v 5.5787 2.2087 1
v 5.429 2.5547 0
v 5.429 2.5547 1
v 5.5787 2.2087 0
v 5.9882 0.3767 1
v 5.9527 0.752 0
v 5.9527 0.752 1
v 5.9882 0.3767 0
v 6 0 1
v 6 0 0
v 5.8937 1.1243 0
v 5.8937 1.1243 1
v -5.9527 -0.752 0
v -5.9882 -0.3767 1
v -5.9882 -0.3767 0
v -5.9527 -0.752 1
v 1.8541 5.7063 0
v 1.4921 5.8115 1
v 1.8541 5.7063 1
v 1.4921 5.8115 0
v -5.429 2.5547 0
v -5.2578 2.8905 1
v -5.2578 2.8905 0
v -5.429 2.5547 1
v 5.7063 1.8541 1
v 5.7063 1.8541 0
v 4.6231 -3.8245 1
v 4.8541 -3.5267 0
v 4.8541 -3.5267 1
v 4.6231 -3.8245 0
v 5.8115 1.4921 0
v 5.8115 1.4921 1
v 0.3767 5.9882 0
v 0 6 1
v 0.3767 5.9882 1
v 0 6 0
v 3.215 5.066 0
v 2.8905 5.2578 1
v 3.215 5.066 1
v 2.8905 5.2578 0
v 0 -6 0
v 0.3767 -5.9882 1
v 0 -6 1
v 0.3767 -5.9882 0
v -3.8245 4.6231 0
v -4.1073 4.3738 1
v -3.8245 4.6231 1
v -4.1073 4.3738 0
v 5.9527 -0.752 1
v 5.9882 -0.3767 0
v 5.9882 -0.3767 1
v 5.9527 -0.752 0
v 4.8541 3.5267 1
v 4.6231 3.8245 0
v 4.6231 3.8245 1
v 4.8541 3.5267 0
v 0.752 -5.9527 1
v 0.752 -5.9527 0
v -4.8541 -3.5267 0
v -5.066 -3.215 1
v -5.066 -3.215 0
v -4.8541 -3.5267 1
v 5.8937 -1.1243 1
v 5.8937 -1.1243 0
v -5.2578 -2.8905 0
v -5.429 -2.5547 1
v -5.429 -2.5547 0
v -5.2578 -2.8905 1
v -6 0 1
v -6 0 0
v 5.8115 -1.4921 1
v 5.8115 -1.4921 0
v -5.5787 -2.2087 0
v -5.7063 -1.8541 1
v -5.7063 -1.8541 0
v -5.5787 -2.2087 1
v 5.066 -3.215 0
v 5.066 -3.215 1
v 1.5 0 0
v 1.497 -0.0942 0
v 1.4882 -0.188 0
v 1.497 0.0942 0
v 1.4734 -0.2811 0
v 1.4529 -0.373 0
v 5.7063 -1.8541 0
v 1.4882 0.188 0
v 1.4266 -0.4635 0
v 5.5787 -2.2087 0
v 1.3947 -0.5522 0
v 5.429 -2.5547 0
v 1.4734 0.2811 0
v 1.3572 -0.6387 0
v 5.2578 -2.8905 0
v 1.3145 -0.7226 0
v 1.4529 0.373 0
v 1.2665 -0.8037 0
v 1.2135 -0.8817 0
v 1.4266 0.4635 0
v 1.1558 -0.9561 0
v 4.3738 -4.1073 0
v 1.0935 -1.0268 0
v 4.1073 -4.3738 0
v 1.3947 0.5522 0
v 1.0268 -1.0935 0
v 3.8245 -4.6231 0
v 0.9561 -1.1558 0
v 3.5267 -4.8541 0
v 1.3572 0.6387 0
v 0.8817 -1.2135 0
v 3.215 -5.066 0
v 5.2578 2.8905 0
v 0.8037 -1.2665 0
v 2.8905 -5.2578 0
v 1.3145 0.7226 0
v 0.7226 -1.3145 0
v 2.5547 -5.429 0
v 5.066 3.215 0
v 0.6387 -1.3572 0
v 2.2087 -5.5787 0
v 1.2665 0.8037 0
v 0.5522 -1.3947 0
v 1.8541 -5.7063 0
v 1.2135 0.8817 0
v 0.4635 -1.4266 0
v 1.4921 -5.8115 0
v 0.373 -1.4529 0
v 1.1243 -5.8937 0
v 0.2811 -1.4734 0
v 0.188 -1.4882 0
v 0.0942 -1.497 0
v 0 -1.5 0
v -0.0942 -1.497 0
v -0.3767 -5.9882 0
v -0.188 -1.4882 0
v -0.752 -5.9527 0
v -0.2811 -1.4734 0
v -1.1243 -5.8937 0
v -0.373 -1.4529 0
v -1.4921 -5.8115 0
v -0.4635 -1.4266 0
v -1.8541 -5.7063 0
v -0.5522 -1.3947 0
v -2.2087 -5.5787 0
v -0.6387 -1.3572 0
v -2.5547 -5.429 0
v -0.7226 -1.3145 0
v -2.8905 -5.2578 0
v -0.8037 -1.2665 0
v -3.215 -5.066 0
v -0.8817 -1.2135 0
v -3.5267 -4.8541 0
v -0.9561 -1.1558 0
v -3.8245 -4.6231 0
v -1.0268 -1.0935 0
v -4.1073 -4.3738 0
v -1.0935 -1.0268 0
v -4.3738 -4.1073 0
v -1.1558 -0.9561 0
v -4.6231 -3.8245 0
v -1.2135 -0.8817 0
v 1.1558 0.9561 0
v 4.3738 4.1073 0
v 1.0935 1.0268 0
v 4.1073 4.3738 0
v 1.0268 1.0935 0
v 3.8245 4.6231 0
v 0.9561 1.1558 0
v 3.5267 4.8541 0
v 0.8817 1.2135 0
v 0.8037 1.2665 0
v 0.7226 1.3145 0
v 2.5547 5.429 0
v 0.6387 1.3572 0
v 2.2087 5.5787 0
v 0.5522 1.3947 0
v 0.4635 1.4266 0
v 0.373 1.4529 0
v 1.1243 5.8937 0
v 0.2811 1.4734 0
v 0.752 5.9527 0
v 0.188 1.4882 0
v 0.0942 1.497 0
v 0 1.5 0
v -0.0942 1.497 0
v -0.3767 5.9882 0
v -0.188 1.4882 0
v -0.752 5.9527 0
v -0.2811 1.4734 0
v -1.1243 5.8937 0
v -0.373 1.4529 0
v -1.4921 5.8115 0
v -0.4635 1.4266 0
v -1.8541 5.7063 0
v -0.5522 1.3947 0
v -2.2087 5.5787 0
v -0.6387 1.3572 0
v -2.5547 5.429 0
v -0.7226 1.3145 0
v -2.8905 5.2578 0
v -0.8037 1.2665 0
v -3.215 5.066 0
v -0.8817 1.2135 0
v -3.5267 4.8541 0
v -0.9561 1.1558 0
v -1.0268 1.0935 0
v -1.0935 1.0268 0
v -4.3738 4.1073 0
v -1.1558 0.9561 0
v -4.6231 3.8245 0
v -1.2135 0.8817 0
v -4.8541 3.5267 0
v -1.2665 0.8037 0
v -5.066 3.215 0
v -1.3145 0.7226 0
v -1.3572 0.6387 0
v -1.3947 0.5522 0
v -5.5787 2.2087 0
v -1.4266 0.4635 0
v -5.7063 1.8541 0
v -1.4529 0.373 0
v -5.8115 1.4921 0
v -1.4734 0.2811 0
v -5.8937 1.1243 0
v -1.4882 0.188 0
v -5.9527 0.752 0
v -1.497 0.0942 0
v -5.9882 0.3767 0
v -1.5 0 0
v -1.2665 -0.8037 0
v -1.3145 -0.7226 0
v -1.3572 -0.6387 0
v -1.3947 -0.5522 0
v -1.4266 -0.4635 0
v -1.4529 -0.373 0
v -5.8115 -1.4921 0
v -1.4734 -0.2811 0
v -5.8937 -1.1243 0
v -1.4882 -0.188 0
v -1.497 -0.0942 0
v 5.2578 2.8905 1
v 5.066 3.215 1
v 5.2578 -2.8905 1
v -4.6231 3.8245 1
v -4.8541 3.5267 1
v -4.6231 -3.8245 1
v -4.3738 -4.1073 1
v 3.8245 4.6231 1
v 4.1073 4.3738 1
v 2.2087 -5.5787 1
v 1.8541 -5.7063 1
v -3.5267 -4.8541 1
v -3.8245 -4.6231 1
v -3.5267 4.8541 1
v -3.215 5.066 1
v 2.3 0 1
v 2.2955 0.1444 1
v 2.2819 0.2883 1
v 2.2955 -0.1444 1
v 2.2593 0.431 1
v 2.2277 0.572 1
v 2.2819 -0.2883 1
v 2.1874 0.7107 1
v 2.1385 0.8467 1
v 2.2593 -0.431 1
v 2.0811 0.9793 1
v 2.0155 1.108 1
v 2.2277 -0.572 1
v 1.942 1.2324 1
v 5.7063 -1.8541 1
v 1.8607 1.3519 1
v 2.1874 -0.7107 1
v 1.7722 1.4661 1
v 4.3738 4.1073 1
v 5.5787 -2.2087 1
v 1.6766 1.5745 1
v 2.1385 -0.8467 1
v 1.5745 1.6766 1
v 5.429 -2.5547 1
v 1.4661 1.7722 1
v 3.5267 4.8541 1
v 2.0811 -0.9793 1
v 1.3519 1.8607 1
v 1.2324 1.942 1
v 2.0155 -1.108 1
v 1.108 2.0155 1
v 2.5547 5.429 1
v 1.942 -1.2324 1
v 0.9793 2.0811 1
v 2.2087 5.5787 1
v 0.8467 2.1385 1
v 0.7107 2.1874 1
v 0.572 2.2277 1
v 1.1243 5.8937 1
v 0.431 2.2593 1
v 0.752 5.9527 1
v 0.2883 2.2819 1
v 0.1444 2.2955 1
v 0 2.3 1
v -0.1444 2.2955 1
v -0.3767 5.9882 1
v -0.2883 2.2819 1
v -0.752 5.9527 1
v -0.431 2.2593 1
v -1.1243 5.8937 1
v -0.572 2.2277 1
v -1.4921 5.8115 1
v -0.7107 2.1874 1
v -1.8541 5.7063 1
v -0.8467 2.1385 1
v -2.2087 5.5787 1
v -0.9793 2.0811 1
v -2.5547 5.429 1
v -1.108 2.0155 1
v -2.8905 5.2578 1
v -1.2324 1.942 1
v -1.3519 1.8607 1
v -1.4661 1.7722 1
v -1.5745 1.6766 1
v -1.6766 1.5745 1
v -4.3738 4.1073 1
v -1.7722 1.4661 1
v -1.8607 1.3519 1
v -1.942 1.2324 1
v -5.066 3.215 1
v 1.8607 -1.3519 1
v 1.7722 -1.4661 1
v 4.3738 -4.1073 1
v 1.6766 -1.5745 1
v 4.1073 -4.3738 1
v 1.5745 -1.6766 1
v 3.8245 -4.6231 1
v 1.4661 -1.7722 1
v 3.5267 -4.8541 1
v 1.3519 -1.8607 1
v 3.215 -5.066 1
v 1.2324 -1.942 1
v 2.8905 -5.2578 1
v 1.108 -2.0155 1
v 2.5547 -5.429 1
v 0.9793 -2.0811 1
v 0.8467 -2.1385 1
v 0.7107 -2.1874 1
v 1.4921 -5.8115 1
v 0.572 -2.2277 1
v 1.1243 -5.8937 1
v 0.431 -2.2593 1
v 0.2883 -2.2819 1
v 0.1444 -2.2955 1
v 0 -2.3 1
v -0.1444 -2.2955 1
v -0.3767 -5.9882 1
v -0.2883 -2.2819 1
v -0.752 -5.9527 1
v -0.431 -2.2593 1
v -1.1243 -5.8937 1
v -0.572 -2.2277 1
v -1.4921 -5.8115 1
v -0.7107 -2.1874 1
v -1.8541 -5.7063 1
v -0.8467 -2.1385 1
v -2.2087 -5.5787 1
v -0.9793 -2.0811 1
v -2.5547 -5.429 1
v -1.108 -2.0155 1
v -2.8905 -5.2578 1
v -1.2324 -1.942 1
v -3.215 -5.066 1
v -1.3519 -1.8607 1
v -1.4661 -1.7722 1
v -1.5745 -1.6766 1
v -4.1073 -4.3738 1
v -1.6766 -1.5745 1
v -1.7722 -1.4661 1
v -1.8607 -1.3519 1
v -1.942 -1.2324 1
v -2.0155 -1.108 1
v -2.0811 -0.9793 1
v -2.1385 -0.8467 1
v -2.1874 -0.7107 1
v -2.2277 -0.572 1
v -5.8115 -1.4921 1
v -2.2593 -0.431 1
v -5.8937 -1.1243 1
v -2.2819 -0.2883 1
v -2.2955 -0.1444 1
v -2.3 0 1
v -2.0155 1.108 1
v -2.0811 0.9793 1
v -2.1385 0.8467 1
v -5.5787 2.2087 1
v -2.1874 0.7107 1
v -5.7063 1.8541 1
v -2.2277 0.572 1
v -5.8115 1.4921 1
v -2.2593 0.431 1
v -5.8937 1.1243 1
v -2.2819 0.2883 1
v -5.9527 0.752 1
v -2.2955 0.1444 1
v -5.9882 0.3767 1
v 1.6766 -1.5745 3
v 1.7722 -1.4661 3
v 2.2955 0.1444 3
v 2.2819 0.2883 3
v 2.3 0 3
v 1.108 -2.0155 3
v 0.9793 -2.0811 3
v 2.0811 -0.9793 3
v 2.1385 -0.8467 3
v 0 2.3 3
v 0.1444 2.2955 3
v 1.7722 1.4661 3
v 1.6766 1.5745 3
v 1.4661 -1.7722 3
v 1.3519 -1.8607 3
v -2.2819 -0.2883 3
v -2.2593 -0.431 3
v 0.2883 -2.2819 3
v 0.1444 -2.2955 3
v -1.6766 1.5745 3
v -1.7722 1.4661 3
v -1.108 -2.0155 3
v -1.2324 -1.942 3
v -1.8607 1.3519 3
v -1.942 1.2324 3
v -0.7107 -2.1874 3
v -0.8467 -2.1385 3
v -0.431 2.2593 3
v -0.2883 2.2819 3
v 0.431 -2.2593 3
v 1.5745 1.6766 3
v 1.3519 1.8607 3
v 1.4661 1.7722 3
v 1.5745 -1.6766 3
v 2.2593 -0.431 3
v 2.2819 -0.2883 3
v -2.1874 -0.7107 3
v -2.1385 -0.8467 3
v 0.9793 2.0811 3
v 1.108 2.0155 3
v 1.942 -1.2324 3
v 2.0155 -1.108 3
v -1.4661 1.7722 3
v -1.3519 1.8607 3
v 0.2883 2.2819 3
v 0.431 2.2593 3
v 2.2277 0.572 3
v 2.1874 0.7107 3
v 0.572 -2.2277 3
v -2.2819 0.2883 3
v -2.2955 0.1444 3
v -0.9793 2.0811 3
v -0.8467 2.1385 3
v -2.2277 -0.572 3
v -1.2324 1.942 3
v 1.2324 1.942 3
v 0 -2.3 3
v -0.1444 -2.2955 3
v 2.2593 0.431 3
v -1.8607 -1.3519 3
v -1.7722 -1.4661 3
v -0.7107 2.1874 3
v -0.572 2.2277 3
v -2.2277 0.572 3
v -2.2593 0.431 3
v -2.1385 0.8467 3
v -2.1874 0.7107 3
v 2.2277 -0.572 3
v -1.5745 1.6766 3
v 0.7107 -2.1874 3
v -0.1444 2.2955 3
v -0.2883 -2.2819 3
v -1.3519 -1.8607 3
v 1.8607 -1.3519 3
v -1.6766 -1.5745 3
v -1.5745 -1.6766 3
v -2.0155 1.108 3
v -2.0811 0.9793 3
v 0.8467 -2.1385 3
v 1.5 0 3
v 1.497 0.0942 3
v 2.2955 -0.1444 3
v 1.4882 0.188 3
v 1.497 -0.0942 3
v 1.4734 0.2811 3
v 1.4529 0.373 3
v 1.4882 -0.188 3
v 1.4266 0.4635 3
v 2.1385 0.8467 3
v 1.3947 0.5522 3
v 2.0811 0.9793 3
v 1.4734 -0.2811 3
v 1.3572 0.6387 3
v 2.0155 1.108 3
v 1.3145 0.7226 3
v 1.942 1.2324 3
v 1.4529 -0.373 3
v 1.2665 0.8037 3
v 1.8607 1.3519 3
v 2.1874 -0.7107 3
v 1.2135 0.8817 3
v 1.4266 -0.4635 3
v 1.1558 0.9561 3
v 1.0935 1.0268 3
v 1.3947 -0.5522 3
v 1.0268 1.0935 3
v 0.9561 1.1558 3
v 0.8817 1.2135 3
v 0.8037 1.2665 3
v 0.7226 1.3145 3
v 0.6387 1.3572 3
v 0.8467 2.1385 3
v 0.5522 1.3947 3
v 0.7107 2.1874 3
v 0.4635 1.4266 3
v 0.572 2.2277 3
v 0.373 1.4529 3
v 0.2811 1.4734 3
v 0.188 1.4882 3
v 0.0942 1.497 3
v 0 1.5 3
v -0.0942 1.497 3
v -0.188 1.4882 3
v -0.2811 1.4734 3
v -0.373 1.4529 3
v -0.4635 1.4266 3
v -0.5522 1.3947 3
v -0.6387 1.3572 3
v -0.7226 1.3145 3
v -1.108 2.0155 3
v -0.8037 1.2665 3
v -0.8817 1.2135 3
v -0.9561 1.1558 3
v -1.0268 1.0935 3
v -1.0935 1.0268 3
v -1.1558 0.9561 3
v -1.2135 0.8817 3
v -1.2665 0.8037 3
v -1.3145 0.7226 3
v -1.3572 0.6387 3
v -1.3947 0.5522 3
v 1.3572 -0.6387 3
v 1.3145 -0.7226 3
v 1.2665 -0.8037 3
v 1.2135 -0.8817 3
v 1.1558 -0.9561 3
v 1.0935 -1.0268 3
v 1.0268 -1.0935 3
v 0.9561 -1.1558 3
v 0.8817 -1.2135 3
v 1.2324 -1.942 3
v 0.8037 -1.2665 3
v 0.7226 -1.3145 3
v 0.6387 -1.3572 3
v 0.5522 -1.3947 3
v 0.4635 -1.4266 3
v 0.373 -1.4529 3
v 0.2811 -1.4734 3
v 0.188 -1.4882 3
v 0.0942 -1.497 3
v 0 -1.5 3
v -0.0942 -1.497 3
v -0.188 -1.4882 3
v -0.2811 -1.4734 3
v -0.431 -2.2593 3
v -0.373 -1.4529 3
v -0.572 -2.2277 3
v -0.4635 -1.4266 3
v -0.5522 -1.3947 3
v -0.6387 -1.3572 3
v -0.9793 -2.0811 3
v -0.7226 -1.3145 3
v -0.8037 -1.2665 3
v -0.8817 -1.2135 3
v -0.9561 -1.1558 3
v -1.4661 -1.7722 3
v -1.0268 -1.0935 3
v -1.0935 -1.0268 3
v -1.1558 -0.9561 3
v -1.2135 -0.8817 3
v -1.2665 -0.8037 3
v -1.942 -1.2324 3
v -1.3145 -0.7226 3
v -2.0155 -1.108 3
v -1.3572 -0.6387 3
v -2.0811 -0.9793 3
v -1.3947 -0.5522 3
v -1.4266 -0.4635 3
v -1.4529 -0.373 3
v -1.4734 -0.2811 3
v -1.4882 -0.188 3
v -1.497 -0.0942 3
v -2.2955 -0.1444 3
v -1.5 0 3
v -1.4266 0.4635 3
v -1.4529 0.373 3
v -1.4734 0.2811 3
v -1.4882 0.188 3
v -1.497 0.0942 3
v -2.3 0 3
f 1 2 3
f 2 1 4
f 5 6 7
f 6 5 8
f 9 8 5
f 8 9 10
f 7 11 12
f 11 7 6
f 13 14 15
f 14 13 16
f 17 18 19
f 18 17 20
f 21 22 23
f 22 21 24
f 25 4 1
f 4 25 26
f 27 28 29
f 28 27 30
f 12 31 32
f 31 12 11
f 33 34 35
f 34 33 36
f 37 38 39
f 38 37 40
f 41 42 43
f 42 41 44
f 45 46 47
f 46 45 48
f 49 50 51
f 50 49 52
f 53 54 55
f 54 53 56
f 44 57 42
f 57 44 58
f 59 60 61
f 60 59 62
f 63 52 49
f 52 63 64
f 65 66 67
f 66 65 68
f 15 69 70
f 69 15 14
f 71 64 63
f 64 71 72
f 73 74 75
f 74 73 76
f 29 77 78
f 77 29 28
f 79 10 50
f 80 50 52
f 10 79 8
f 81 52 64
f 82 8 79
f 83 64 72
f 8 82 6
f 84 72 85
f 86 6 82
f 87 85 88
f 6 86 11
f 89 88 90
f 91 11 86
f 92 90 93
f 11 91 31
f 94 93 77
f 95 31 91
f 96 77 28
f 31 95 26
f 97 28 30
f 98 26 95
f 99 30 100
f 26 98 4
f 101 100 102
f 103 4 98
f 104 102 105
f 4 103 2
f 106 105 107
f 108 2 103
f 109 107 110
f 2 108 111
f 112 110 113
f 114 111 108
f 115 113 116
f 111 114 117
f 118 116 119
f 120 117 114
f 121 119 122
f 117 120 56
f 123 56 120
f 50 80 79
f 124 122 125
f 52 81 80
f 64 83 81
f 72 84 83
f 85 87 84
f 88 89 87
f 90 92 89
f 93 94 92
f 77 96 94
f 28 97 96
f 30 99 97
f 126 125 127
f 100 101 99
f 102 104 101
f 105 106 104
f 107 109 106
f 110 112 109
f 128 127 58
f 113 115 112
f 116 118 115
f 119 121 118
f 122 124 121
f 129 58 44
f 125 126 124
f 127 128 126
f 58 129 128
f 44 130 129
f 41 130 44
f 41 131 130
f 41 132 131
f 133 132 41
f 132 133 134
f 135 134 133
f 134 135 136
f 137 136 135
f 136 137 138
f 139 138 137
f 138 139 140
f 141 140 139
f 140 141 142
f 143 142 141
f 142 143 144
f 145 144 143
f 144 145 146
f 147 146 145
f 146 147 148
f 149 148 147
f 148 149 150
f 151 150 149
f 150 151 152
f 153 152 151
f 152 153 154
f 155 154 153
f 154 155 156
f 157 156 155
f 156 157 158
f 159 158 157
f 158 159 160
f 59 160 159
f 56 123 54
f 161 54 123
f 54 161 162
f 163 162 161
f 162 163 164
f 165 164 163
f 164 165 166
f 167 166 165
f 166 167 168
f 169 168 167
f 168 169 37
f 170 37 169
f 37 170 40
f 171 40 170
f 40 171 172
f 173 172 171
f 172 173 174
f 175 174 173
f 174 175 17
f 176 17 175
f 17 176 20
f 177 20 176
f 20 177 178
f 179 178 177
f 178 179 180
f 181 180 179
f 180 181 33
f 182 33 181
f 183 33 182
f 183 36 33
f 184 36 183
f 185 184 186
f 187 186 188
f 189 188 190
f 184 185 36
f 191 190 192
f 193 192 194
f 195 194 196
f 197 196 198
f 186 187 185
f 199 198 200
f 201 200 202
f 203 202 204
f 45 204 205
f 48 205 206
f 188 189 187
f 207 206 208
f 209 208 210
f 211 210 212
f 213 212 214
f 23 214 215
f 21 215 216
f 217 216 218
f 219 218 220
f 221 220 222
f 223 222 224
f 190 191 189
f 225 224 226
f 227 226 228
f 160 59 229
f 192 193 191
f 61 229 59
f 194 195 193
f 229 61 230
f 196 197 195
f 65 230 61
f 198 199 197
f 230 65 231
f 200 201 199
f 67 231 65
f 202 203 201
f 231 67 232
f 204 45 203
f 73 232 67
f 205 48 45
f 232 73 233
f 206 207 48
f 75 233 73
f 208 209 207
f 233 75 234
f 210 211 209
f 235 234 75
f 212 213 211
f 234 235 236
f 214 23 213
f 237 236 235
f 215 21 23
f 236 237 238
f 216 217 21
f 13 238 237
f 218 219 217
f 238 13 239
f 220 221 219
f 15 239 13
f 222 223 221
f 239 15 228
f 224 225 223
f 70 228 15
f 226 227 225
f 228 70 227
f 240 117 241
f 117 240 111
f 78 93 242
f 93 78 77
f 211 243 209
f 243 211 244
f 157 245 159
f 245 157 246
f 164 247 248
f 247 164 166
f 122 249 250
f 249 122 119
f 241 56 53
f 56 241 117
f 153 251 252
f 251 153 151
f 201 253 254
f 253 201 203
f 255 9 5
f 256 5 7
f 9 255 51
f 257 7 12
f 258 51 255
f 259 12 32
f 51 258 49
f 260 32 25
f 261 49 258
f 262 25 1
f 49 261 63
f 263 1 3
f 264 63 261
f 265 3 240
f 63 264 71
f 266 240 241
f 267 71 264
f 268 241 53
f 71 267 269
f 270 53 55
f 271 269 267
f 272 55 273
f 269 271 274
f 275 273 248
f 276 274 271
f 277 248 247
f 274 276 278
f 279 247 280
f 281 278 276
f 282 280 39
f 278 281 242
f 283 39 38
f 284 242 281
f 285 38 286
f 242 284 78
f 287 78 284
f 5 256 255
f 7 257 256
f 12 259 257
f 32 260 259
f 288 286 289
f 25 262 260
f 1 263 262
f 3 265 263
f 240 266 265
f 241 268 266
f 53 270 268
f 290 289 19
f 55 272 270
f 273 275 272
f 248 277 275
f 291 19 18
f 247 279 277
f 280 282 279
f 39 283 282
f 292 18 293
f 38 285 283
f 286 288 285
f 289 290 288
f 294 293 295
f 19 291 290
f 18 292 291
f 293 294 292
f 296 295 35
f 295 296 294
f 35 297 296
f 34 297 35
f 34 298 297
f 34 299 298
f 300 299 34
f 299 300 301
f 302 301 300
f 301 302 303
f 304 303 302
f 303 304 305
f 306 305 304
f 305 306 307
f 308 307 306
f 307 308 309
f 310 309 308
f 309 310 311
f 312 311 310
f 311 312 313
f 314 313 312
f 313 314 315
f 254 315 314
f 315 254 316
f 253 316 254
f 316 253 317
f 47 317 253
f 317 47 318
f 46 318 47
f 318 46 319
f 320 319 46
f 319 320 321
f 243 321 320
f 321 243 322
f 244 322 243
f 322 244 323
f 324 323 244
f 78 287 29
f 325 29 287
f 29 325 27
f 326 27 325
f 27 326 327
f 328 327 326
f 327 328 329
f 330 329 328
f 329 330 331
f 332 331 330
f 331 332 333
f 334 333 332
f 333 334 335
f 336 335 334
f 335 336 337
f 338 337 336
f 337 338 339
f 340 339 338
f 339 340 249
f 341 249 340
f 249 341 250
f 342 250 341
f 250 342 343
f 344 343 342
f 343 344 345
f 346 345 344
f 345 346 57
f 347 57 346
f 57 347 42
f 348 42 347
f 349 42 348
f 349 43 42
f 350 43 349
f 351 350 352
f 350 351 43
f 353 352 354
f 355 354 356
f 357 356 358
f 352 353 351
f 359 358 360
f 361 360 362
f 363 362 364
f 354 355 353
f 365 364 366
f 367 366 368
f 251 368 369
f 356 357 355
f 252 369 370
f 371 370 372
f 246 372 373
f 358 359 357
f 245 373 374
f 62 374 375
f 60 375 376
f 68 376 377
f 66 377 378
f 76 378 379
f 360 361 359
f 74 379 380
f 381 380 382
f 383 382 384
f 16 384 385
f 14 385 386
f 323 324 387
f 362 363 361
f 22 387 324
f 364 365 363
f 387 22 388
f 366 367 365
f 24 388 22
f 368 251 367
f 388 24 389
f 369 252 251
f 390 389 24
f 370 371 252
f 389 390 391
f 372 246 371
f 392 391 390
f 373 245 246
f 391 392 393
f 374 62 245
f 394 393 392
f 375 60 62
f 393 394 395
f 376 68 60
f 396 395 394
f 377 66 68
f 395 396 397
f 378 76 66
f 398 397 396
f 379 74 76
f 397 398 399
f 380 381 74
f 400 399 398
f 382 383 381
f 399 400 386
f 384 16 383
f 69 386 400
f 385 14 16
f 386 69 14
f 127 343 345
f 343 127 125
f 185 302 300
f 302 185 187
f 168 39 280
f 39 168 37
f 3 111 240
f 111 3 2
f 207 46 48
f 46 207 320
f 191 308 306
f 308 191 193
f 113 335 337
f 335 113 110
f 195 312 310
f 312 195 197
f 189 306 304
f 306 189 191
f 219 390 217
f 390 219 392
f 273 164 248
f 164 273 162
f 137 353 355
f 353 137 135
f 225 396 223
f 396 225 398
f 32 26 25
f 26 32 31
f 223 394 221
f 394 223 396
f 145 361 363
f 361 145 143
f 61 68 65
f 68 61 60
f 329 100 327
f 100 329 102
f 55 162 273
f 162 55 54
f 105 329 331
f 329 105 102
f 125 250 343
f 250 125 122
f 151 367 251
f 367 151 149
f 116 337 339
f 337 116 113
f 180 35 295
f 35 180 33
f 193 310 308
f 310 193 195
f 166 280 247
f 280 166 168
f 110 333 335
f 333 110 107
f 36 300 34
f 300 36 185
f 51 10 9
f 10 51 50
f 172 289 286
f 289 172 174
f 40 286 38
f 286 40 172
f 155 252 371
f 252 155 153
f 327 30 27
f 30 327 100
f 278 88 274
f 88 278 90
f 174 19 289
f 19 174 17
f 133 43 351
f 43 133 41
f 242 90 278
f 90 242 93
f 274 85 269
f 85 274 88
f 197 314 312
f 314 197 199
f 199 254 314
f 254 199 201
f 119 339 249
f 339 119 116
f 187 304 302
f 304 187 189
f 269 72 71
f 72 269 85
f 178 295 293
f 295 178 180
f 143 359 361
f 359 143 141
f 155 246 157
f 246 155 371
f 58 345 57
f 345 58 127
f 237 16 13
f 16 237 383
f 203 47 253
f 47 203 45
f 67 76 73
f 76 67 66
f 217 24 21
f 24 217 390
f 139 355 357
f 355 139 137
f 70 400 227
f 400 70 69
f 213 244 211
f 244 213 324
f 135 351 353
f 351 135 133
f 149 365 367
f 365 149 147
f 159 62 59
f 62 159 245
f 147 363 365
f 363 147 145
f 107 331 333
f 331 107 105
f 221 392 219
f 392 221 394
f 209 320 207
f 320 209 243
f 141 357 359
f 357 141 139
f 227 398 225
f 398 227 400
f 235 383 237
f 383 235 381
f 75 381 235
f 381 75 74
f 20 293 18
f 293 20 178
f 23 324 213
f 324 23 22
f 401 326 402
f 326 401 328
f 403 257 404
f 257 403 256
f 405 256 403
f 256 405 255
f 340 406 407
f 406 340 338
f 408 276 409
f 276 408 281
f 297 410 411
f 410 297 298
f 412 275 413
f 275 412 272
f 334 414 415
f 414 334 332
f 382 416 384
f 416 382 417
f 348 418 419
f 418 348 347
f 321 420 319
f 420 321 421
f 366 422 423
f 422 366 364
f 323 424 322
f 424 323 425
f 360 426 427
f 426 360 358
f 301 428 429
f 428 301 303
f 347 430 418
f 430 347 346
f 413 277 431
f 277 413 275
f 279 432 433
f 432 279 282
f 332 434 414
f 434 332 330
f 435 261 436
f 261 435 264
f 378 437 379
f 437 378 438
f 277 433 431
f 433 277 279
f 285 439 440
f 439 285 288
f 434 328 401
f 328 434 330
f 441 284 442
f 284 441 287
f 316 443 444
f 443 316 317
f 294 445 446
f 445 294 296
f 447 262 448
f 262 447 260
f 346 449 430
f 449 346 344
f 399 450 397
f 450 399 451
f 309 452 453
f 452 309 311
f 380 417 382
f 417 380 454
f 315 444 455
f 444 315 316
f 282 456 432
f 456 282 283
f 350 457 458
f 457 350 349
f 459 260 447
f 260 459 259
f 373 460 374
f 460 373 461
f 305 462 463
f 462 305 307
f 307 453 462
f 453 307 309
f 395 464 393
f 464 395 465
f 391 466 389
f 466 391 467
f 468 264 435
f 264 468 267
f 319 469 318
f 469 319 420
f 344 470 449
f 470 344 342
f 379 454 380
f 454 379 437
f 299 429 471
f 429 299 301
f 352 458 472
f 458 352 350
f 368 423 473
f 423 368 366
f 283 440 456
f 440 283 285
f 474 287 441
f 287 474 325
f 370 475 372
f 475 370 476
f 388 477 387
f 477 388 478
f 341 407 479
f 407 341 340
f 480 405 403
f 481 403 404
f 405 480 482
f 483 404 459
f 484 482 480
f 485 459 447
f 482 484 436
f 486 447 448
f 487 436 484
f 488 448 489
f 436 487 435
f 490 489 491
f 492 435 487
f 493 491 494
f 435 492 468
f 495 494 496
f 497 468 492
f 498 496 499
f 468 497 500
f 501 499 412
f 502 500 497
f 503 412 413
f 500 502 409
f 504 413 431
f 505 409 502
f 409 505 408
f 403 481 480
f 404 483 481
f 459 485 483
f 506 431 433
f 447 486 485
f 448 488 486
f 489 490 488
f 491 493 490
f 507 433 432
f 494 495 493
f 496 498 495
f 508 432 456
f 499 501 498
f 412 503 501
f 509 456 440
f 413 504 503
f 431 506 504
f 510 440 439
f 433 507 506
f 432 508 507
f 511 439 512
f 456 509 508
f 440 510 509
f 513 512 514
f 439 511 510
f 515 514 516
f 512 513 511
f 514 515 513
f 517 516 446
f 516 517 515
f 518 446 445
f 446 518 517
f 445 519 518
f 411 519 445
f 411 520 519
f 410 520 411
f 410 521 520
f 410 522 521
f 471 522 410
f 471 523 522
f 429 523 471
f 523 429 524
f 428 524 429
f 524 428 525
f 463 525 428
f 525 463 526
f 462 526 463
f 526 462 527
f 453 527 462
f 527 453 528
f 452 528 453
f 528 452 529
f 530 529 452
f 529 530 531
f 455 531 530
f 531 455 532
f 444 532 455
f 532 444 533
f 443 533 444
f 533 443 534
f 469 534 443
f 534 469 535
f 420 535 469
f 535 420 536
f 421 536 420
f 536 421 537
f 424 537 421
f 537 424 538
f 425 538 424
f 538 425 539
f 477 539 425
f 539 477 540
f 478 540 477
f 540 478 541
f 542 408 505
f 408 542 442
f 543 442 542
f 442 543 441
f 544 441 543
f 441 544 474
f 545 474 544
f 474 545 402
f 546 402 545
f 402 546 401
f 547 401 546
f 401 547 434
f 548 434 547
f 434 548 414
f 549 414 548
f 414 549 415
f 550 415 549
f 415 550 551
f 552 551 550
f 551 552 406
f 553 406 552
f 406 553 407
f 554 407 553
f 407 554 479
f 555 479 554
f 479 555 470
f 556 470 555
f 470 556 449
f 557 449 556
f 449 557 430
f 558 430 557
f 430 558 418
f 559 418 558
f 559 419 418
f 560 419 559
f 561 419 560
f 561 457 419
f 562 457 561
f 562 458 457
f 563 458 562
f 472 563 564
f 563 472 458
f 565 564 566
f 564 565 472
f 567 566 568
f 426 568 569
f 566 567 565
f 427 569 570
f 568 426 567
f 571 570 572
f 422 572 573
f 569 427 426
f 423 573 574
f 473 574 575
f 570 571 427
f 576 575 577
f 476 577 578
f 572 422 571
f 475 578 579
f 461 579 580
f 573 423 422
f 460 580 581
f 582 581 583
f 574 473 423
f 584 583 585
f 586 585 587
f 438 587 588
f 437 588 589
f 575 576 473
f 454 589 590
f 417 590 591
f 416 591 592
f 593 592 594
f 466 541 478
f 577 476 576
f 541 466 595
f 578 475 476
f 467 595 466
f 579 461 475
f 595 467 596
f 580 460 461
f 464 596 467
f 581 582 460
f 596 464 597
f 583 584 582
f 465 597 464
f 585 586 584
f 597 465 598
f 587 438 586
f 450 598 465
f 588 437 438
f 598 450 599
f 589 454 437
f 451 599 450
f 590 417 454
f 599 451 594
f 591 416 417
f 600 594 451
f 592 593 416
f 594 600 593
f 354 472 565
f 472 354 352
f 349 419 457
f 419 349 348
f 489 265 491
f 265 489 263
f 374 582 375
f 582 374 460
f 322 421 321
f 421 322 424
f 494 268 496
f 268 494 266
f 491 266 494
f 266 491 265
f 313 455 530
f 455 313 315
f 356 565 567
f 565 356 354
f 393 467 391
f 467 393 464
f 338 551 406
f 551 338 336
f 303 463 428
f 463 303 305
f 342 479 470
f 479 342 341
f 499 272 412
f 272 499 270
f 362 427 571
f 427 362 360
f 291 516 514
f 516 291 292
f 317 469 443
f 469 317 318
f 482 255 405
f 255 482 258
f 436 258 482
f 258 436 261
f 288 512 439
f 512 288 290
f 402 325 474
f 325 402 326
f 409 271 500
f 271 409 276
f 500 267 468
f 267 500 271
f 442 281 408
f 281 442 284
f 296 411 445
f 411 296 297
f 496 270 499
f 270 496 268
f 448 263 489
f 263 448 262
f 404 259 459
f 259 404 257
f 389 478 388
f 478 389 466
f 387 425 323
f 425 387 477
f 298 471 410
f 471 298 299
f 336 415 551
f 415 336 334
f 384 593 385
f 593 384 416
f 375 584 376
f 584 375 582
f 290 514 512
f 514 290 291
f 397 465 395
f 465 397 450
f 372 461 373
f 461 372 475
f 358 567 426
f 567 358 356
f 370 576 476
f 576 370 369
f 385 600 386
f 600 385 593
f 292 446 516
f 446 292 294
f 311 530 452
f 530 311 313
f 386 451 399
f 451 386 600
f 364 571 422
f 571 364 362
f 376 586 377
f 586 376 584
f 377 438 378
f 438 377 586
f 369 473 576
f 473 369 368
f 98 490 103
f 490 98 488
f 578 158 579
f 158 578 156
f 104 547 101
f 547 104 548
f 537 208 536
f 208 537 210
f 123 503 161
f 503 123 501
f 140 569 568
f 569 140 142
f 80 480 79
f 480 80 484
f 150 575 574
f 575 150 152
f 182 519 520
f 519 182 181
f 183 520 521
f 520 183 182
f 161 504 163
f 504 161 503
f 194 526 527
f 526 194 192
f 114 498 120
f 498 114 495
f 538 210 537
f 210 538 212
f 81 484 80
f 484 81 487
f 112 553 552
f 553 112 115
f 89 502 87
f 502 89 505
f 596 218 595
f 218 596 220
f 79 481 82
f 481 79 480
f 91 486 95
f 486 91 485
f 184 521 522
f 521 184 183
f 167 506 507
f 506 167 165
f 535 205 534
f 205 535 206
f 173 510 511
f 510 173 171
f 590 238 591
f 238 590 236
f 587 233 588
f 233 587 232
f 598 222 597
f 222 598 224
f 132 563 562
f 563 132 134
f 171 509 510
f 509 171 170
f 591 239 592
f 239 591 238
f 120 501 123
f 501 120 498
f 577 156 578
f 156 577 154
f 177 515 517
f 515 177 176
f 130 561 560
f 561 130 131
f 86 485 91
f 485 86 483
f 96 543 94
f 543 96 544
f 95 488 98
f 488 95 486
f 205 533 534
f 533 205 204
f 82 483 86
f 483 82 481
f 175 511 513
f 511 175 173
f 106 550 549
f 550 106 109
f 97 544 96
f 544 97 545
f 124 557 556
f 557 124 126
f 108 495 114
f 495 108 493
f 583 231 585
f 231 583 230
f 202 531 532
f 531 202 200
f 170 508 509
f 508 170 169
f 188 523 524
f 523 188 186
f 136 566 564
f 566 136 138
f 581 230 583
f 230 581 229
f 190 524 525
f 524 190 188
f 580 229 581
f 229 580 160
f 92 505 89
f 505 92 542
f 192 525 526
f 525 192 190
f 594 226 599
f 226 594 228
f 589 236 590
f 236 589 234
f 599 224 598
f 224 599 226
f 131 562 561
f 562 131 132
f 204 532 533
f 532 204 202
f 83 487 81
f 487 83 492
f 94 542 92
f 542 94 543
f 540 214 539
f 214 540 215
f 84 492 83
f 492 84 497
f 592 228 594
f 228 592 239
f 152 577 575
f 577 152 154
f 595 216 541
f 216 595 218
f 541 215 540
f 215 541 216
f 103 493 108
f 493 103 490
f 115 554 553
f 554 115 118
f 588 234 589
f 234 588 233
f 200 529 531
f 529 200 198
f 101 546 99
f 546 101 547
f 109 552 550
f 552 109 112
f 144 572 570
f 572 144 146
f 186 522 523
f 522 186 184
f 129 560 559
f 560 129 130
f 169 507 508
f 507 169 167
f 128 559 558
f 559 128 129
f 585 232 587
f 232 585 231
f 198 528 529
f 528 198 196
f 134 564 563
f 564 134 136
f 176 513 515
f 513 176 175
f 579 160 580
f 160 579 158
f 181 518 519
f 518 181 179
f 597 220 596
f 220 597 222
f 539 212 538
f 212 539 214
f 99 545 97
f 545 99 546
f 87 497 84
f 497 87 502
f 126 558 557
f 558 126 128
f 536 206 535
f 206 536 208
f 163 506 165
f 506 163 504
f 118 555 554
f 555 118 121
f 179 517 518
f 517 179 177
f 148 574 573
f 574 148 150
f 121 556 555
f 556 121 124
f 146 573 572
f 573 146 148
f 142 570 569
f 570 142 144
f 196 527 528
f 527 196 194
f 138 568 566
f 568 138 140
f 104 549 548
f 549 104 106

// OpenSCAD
$fn=100;

difference() {
	union() {
		cylinder(d=12,h=1);
		cylinder(d=4.6,h=3);
	}
	cylinder(d=3,h=8);
}
